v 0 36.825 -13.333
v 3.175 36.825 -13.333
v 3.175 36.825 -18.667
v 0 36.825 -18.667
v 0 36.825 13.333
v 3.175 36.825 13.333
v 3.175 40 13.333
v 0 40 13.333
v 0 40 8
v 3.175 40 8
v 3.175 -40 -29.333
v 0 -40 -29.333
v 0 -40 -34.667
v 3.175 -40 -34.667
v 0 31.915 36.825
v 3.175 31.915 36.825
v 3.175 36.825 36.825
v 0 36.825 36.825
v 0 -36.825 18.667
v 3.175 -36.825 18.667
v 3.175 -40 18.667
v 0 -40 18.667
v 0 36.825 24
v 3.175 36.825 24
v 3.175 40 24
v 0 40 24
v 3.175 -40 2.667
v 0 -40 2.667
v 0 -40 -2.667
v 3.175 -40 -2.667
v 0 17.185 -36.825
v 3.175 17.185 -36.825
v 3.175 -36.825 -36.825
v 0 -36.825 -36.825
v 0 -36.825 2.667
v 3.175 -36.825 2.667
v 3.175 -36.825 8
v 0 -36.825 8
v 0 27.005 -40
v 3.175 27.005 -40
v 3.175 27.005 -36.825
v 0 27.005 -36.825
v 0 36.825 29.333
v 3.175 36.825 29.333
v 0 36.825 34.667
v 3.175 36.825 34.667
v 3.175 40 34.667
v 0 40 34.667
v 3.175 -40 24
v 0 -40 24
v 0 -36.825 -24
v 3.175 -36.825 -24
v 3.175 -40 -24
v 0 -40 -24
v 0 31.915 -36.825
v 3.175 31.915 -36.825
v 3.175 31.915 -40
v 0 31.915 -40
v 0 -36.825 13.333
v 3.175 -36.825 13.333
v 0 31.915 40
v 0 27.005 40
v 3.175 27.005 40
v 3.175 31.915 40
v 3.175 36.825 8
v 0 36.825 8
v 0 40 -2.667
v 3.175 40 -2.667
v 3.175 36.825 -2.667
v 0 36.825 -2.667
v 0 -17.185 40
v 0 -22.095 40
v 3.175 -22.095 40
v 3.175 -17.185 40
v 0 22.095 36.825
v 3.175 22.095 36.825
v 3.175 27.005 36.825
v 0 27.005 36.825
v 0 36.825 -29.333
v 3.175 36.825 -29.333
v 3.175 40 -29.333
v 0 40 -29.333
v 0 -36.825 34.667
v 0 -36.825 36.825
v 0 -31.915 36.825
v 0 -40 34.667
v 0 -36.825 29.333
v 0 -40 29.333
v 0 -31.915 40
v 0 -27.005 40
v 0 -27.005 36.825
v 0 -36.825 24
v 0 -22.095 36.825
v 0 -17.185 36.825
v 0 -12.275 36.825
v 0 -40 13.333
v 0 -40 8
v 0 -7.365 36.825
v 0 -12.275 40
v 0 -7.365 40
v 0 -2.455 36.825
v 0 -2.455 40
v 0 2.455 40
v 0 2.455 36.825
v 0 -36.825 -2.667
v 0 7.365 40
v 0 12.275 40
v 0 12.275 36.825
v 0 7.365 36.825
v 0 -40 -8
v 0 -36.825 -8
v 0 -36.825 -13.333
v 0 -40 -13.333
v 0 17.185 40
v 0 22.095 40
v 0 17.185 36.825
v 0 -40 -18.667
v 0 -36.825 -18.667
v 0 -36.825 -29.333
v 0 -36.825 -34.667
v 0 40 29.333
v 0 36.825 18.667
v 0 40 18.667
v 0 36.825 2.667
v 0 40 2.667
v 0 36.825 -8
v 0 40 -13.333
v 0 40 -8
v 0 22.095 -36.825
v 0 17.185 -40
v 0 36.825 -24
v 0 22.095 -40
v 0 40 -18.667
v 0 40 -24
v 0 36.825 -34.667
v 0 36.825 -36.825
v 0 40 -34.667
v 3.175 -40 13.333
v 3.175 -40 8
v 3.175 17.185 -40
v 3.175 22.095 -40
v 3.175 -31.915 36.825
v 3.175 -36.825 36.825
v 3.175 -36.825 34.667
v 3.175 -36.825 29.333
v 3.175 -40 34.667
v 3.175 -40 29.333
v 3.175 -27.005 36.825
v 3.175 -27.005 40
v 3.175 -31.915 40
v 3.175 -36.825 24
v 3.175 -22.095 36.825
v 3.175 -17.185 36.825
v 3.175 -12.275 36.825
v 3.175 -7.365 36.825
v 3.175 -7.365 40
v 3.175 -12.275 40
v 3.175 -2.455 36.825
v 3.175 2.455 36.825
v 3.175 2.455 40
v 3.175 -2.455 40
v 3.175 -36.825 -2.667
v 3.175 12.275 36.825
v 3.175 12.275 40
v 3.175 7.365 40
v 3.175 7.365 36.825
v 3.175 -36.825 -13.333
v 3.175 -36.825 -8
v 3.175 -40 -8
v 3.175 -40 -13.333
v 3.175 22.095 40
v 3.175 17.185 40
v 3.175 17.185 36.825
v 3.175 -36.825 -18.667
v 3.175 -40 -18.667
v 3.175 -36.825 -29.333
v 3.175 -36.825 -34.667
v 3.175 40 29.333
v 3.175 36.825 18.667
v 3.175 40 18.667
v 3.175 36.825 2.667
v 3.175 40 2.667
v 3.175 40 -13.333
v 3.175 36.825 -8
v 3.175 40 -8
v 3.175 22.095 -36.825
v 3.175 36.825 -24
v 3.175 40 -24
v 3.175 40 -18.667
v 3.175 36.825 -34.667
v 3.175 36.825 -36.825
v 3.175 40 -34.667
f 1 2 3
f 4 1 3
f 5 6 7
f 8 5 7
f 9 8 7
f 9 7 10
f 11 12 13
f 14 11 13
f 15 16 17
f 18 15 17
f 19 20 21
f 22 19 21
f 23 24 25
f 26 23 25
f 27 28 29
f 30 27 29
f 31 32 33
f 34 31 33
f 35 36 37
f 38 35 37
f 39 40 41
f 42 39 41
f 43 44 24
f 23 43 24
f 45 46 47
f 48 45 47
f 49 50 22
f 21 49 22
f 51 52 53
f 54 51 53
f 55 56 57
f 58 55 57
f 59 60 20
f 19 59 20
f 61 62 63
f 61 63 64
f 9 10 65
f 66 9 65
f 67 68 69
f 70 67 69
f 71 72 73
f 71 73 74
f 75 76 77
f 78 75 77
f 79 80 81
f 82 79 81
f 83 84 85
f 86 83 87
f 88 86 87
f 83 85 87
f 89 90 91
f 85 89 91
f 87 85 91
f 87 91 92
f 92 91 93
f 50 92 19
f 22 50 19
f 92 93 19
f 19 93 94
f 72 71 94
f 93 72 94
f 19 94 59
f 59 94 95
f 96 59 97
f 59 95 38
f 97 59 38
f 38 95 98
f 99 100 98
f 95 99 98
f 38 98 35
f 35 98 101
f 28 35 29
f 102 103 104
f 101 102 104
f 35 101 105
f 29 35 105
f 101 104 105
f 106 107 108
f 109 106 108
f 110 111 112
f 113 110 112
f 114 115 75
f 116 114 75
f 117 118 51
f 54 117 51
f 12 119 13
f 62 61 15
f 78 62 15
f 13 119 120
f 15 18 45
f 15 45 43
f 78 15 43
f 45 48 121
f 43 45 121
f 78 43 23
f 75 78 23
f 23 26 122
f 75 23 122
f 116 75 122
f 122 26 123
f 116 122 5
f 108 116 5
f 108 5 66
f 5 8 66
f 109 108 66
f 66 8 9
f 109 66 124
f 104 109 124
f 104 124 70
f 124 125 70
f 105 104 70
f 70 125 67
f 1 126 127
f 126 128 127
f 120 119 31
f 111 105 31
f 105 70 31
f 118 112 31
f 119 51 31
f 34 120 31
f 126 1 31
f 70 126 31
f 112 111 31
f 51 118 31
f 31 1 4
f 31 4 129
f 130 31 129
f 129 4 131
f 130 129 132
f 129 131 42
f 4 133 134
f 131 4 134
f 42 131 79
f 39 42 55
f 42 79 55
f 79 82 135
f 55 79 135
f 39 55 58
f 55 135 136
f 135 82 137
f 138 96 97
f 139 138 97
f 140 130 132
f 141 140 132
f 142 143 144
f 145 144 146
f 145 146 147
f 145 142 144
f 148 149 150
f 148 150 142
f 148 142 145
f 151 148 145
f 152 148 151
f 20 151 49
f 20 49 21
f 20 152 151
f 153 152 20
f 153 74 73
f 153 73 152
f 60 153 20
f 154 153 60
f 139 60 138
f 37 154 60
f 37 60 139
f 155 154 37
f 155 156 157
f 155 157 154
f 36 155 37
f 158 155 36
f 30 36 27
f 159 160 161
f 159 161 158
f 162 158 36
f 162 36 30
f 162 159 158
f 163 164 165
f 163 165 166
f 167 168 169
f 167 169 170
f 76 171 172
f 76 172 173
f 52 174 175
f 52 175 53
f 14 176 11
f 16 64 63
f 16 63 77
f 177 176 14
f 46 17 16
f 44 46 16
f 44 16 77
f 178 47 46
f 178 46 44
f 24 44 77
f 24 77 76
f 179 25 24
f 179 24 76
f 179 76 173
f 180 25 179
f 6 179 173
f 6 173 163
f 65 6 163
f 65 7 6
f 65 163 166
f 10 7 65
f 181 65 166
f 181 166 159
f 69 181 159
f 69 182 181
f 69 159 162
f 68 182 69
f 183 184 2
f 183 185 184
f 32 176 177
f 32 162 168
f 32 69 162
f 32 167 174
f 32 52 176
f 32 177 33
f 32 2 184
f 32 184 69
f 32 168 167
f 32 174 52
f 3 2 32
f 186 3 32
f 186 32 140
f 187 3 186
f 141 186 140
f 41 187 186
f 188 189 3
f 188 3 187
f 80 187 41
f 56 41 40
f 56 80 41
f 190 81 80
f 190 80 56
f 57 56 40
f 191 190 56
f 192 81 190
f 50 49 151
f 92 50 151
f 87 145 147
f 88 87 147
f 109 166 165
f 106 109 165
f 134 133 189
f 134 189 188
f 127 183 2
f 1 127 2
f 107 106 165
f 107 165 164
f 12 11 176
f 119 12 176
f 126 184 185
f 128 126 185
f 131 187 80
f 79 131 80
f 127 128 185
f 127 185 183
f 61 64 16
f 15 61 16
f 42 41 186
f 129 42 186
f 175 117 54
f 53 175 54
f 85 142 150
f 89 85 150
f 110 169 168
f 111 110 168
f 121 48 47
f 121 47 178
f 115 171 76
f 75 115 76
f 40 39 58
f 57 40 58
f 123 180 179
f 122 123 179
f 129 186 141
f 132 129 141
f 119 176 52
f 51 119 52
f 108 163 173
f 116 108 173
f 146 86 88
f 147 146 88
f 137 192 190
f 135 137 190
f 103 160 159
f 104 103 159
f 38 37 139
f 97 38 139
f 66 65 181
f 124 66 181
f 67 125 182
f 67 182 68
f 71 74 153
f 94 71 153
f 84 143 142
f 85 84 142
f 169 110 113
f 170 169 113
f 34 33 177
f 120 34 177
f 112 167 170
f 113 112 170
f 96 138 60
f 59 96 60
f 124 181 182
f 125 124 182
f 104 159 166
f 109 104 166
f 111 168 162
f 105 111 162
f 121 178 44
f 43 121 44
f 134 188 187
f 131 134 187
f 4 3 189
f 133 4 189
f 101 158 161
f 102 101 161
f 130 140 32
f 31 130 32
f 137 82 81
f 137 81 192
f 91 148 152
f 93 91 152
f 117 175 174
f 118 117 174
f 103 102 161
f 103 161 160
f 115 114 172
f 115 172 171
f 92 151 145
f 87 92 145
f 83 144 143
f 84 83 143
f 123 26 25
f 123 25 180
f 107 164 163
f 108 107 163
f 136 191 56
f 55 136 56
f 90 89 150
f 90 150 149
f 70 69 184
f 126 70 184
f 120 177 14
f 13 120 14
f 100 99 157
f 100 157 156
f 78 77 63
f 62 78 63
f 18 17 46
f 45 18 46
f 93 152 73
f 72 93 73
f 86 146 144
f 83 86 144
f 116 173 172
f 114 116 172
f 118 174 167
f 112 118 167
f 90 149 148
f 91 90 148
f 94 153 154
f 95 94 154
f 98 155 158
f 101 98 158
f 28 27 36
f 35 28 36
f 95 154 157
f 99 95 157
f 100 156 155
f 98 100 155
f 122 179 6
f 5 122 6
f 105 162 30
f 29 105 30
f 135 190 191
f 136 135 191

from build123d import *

# Parameters (mm, degrees)
SKETCH2_W           = 80
SKETCH2_H           = 80
BOSS_EXTRUDE1_DEPTH = 3.175
SKETCH3_OUTSIDE_W   = 104.636
SKETCH3_OUTSIDE_H   = 104.636
CUT_EXTRUDE1_DEPTH  = 57.657573413
SKETCH4_W           = 3.175
SKETCH4_H           = 49.1
CUT_EXTRUDE2_DEPTH  = 57.657573413


with BuildPart() as part:
    # Sketch2 → Boss-Extrude1 (new body)
    with BuildSketch(Plane(origin=(0, 0, 0), x_dir=(0, 0, -1), z_dir=(1, 0, 0))):
        Rectangle(SKETCH2_W, SKETCH2_H)
    extrude(amount=BOSS_EXTRUDE1_DEPTH)

    # Sketch3 outside → Cut-Extrude1 (cut, through all)
    with BuildSketch(Plane(origin=(3.175, 0, 0), x_dir=(0, 0, -1), z_dir=(1, 0, 0))):
        Rectangle(SKETCH3_OUTSIDE_W, SKETCH3_OUTSIDE_H)
        Polygon((34.666666667, 36.825), (36.825, 36.825), (36.825, 31.915), (40, 31.915), (40, 27.005), (36.825, 27.005), (36.825, 22.095), (40, 22.095), (40, 17.185), (36.825, 17.185), (36.825, 12.275), (40, 12.275), (40, 7.365), (36.825, 7.365), (36.825, 2.455), (40, 2.455), (40, -2.455), (36.825, -2.455), (36.825, -7.365), (40, -7.365), (40, -12.275), (36.825, -12.275), (36.825, -17.185), (40, -17.185), (40, -22.095), (36.825, -22.095), (36.825, -27.005), (40, -27.005), (40, -31.915), (36.825, -31.915), (36.825, -36.825), (34.666666667, -36.825), (34.666666667, -40), (29.333333333, -40), (29.333333333, -36.825), (24, -36.825), (24, -40), (18.666666667, -40), (18.666666667, -36.825), (13.333333333, -36.825), (13.333333333, -40), (8, -40), (8, -36.825), (2.666666667, -36.825), (2.666666667, -40), (-2.666666667, -40), (-2.666666667, -36.825), (-8, -36.825), (-8, -40), (-13.333333333, -40), (-13.333333333, -36.825), (-18.666666667, -36.825), (-18.666666667, -40), (-24, -40), (-24, -36.825), (-29.333333333, -36.825), (-29.333333333, -40), (-34.666666667, -40), (-34.666666667, -36.825), (-36.825, -36.825), (-36.825, -31.915), (-40, -31.915), (-40, -27.005), (-36.825, -27.005), (-36.825, -22.095), (-40, -22.095), (-40, -17.185), (-36.825, -17.185), (-36.825, -12.275), (-40, -12.275), (-40, -7.365), (-36.825, -7.365), (-36.825, -2.455), (-40, -2.455), (-40, 2.455), (-36.825, 2.455), (-36.825, 7.365), (-40, 7.365), (-40, 12.275), (-36.825, 12.275), (-36.825, 17.185), (-40, 17.185), (-40, 22.095), (-36.825, 22.095), (-36.825, 27.005), (-40, 27.005), (-40, 31.915), (-36.825, 31.915), (-36.825, 36.825), (-34.666666667, 36.825), (-34.666666667, 40), (-29.333333333, 40), (-29.333333333, 36.825), (-24, 36.825), (-24, 40), (-18.666666667, 40), (-18.666666667, 36.825), (-13.333333333, 36.825), (-13.333333333, 40), (-8, 40), (-8, 36.825), (-2.666666667, 36.825), (-2.666666667, 40), (2.666666667, 40), (2.666666667, 36.825), (8, 36.825), (8, 40), (13.333333333, 40), (13.333333333, 36.825), (18.666666667, 36.825), (18.666666667, 40), (24, 40), (24, 36.825), (29.333333333, 36.825), (29.333333333, 40), (34.666666667, 40), align=None, mode=Mode.SUBTRACT)
    extrude(amount=-CUT_EXTRUDE1_DEPTH, mode=Mode.SUBTRACT)

    # Sketch4 → Cut-Extrude2 (cut, through all)
    with BuildSketch(Plane(origin=(3.175, 0, 0), x_dir=(0, 0, -1), z_dir=(1, 0, 0))):
        with Locations((38.4125, -12.275)):
            Rectangle(SKETCH4_W, SKETCH4_H)
    extrude(amount=-CUT_EXTRUDE2_DEPTH, mode=Mode.SUBTRACT)


solid = part.part
